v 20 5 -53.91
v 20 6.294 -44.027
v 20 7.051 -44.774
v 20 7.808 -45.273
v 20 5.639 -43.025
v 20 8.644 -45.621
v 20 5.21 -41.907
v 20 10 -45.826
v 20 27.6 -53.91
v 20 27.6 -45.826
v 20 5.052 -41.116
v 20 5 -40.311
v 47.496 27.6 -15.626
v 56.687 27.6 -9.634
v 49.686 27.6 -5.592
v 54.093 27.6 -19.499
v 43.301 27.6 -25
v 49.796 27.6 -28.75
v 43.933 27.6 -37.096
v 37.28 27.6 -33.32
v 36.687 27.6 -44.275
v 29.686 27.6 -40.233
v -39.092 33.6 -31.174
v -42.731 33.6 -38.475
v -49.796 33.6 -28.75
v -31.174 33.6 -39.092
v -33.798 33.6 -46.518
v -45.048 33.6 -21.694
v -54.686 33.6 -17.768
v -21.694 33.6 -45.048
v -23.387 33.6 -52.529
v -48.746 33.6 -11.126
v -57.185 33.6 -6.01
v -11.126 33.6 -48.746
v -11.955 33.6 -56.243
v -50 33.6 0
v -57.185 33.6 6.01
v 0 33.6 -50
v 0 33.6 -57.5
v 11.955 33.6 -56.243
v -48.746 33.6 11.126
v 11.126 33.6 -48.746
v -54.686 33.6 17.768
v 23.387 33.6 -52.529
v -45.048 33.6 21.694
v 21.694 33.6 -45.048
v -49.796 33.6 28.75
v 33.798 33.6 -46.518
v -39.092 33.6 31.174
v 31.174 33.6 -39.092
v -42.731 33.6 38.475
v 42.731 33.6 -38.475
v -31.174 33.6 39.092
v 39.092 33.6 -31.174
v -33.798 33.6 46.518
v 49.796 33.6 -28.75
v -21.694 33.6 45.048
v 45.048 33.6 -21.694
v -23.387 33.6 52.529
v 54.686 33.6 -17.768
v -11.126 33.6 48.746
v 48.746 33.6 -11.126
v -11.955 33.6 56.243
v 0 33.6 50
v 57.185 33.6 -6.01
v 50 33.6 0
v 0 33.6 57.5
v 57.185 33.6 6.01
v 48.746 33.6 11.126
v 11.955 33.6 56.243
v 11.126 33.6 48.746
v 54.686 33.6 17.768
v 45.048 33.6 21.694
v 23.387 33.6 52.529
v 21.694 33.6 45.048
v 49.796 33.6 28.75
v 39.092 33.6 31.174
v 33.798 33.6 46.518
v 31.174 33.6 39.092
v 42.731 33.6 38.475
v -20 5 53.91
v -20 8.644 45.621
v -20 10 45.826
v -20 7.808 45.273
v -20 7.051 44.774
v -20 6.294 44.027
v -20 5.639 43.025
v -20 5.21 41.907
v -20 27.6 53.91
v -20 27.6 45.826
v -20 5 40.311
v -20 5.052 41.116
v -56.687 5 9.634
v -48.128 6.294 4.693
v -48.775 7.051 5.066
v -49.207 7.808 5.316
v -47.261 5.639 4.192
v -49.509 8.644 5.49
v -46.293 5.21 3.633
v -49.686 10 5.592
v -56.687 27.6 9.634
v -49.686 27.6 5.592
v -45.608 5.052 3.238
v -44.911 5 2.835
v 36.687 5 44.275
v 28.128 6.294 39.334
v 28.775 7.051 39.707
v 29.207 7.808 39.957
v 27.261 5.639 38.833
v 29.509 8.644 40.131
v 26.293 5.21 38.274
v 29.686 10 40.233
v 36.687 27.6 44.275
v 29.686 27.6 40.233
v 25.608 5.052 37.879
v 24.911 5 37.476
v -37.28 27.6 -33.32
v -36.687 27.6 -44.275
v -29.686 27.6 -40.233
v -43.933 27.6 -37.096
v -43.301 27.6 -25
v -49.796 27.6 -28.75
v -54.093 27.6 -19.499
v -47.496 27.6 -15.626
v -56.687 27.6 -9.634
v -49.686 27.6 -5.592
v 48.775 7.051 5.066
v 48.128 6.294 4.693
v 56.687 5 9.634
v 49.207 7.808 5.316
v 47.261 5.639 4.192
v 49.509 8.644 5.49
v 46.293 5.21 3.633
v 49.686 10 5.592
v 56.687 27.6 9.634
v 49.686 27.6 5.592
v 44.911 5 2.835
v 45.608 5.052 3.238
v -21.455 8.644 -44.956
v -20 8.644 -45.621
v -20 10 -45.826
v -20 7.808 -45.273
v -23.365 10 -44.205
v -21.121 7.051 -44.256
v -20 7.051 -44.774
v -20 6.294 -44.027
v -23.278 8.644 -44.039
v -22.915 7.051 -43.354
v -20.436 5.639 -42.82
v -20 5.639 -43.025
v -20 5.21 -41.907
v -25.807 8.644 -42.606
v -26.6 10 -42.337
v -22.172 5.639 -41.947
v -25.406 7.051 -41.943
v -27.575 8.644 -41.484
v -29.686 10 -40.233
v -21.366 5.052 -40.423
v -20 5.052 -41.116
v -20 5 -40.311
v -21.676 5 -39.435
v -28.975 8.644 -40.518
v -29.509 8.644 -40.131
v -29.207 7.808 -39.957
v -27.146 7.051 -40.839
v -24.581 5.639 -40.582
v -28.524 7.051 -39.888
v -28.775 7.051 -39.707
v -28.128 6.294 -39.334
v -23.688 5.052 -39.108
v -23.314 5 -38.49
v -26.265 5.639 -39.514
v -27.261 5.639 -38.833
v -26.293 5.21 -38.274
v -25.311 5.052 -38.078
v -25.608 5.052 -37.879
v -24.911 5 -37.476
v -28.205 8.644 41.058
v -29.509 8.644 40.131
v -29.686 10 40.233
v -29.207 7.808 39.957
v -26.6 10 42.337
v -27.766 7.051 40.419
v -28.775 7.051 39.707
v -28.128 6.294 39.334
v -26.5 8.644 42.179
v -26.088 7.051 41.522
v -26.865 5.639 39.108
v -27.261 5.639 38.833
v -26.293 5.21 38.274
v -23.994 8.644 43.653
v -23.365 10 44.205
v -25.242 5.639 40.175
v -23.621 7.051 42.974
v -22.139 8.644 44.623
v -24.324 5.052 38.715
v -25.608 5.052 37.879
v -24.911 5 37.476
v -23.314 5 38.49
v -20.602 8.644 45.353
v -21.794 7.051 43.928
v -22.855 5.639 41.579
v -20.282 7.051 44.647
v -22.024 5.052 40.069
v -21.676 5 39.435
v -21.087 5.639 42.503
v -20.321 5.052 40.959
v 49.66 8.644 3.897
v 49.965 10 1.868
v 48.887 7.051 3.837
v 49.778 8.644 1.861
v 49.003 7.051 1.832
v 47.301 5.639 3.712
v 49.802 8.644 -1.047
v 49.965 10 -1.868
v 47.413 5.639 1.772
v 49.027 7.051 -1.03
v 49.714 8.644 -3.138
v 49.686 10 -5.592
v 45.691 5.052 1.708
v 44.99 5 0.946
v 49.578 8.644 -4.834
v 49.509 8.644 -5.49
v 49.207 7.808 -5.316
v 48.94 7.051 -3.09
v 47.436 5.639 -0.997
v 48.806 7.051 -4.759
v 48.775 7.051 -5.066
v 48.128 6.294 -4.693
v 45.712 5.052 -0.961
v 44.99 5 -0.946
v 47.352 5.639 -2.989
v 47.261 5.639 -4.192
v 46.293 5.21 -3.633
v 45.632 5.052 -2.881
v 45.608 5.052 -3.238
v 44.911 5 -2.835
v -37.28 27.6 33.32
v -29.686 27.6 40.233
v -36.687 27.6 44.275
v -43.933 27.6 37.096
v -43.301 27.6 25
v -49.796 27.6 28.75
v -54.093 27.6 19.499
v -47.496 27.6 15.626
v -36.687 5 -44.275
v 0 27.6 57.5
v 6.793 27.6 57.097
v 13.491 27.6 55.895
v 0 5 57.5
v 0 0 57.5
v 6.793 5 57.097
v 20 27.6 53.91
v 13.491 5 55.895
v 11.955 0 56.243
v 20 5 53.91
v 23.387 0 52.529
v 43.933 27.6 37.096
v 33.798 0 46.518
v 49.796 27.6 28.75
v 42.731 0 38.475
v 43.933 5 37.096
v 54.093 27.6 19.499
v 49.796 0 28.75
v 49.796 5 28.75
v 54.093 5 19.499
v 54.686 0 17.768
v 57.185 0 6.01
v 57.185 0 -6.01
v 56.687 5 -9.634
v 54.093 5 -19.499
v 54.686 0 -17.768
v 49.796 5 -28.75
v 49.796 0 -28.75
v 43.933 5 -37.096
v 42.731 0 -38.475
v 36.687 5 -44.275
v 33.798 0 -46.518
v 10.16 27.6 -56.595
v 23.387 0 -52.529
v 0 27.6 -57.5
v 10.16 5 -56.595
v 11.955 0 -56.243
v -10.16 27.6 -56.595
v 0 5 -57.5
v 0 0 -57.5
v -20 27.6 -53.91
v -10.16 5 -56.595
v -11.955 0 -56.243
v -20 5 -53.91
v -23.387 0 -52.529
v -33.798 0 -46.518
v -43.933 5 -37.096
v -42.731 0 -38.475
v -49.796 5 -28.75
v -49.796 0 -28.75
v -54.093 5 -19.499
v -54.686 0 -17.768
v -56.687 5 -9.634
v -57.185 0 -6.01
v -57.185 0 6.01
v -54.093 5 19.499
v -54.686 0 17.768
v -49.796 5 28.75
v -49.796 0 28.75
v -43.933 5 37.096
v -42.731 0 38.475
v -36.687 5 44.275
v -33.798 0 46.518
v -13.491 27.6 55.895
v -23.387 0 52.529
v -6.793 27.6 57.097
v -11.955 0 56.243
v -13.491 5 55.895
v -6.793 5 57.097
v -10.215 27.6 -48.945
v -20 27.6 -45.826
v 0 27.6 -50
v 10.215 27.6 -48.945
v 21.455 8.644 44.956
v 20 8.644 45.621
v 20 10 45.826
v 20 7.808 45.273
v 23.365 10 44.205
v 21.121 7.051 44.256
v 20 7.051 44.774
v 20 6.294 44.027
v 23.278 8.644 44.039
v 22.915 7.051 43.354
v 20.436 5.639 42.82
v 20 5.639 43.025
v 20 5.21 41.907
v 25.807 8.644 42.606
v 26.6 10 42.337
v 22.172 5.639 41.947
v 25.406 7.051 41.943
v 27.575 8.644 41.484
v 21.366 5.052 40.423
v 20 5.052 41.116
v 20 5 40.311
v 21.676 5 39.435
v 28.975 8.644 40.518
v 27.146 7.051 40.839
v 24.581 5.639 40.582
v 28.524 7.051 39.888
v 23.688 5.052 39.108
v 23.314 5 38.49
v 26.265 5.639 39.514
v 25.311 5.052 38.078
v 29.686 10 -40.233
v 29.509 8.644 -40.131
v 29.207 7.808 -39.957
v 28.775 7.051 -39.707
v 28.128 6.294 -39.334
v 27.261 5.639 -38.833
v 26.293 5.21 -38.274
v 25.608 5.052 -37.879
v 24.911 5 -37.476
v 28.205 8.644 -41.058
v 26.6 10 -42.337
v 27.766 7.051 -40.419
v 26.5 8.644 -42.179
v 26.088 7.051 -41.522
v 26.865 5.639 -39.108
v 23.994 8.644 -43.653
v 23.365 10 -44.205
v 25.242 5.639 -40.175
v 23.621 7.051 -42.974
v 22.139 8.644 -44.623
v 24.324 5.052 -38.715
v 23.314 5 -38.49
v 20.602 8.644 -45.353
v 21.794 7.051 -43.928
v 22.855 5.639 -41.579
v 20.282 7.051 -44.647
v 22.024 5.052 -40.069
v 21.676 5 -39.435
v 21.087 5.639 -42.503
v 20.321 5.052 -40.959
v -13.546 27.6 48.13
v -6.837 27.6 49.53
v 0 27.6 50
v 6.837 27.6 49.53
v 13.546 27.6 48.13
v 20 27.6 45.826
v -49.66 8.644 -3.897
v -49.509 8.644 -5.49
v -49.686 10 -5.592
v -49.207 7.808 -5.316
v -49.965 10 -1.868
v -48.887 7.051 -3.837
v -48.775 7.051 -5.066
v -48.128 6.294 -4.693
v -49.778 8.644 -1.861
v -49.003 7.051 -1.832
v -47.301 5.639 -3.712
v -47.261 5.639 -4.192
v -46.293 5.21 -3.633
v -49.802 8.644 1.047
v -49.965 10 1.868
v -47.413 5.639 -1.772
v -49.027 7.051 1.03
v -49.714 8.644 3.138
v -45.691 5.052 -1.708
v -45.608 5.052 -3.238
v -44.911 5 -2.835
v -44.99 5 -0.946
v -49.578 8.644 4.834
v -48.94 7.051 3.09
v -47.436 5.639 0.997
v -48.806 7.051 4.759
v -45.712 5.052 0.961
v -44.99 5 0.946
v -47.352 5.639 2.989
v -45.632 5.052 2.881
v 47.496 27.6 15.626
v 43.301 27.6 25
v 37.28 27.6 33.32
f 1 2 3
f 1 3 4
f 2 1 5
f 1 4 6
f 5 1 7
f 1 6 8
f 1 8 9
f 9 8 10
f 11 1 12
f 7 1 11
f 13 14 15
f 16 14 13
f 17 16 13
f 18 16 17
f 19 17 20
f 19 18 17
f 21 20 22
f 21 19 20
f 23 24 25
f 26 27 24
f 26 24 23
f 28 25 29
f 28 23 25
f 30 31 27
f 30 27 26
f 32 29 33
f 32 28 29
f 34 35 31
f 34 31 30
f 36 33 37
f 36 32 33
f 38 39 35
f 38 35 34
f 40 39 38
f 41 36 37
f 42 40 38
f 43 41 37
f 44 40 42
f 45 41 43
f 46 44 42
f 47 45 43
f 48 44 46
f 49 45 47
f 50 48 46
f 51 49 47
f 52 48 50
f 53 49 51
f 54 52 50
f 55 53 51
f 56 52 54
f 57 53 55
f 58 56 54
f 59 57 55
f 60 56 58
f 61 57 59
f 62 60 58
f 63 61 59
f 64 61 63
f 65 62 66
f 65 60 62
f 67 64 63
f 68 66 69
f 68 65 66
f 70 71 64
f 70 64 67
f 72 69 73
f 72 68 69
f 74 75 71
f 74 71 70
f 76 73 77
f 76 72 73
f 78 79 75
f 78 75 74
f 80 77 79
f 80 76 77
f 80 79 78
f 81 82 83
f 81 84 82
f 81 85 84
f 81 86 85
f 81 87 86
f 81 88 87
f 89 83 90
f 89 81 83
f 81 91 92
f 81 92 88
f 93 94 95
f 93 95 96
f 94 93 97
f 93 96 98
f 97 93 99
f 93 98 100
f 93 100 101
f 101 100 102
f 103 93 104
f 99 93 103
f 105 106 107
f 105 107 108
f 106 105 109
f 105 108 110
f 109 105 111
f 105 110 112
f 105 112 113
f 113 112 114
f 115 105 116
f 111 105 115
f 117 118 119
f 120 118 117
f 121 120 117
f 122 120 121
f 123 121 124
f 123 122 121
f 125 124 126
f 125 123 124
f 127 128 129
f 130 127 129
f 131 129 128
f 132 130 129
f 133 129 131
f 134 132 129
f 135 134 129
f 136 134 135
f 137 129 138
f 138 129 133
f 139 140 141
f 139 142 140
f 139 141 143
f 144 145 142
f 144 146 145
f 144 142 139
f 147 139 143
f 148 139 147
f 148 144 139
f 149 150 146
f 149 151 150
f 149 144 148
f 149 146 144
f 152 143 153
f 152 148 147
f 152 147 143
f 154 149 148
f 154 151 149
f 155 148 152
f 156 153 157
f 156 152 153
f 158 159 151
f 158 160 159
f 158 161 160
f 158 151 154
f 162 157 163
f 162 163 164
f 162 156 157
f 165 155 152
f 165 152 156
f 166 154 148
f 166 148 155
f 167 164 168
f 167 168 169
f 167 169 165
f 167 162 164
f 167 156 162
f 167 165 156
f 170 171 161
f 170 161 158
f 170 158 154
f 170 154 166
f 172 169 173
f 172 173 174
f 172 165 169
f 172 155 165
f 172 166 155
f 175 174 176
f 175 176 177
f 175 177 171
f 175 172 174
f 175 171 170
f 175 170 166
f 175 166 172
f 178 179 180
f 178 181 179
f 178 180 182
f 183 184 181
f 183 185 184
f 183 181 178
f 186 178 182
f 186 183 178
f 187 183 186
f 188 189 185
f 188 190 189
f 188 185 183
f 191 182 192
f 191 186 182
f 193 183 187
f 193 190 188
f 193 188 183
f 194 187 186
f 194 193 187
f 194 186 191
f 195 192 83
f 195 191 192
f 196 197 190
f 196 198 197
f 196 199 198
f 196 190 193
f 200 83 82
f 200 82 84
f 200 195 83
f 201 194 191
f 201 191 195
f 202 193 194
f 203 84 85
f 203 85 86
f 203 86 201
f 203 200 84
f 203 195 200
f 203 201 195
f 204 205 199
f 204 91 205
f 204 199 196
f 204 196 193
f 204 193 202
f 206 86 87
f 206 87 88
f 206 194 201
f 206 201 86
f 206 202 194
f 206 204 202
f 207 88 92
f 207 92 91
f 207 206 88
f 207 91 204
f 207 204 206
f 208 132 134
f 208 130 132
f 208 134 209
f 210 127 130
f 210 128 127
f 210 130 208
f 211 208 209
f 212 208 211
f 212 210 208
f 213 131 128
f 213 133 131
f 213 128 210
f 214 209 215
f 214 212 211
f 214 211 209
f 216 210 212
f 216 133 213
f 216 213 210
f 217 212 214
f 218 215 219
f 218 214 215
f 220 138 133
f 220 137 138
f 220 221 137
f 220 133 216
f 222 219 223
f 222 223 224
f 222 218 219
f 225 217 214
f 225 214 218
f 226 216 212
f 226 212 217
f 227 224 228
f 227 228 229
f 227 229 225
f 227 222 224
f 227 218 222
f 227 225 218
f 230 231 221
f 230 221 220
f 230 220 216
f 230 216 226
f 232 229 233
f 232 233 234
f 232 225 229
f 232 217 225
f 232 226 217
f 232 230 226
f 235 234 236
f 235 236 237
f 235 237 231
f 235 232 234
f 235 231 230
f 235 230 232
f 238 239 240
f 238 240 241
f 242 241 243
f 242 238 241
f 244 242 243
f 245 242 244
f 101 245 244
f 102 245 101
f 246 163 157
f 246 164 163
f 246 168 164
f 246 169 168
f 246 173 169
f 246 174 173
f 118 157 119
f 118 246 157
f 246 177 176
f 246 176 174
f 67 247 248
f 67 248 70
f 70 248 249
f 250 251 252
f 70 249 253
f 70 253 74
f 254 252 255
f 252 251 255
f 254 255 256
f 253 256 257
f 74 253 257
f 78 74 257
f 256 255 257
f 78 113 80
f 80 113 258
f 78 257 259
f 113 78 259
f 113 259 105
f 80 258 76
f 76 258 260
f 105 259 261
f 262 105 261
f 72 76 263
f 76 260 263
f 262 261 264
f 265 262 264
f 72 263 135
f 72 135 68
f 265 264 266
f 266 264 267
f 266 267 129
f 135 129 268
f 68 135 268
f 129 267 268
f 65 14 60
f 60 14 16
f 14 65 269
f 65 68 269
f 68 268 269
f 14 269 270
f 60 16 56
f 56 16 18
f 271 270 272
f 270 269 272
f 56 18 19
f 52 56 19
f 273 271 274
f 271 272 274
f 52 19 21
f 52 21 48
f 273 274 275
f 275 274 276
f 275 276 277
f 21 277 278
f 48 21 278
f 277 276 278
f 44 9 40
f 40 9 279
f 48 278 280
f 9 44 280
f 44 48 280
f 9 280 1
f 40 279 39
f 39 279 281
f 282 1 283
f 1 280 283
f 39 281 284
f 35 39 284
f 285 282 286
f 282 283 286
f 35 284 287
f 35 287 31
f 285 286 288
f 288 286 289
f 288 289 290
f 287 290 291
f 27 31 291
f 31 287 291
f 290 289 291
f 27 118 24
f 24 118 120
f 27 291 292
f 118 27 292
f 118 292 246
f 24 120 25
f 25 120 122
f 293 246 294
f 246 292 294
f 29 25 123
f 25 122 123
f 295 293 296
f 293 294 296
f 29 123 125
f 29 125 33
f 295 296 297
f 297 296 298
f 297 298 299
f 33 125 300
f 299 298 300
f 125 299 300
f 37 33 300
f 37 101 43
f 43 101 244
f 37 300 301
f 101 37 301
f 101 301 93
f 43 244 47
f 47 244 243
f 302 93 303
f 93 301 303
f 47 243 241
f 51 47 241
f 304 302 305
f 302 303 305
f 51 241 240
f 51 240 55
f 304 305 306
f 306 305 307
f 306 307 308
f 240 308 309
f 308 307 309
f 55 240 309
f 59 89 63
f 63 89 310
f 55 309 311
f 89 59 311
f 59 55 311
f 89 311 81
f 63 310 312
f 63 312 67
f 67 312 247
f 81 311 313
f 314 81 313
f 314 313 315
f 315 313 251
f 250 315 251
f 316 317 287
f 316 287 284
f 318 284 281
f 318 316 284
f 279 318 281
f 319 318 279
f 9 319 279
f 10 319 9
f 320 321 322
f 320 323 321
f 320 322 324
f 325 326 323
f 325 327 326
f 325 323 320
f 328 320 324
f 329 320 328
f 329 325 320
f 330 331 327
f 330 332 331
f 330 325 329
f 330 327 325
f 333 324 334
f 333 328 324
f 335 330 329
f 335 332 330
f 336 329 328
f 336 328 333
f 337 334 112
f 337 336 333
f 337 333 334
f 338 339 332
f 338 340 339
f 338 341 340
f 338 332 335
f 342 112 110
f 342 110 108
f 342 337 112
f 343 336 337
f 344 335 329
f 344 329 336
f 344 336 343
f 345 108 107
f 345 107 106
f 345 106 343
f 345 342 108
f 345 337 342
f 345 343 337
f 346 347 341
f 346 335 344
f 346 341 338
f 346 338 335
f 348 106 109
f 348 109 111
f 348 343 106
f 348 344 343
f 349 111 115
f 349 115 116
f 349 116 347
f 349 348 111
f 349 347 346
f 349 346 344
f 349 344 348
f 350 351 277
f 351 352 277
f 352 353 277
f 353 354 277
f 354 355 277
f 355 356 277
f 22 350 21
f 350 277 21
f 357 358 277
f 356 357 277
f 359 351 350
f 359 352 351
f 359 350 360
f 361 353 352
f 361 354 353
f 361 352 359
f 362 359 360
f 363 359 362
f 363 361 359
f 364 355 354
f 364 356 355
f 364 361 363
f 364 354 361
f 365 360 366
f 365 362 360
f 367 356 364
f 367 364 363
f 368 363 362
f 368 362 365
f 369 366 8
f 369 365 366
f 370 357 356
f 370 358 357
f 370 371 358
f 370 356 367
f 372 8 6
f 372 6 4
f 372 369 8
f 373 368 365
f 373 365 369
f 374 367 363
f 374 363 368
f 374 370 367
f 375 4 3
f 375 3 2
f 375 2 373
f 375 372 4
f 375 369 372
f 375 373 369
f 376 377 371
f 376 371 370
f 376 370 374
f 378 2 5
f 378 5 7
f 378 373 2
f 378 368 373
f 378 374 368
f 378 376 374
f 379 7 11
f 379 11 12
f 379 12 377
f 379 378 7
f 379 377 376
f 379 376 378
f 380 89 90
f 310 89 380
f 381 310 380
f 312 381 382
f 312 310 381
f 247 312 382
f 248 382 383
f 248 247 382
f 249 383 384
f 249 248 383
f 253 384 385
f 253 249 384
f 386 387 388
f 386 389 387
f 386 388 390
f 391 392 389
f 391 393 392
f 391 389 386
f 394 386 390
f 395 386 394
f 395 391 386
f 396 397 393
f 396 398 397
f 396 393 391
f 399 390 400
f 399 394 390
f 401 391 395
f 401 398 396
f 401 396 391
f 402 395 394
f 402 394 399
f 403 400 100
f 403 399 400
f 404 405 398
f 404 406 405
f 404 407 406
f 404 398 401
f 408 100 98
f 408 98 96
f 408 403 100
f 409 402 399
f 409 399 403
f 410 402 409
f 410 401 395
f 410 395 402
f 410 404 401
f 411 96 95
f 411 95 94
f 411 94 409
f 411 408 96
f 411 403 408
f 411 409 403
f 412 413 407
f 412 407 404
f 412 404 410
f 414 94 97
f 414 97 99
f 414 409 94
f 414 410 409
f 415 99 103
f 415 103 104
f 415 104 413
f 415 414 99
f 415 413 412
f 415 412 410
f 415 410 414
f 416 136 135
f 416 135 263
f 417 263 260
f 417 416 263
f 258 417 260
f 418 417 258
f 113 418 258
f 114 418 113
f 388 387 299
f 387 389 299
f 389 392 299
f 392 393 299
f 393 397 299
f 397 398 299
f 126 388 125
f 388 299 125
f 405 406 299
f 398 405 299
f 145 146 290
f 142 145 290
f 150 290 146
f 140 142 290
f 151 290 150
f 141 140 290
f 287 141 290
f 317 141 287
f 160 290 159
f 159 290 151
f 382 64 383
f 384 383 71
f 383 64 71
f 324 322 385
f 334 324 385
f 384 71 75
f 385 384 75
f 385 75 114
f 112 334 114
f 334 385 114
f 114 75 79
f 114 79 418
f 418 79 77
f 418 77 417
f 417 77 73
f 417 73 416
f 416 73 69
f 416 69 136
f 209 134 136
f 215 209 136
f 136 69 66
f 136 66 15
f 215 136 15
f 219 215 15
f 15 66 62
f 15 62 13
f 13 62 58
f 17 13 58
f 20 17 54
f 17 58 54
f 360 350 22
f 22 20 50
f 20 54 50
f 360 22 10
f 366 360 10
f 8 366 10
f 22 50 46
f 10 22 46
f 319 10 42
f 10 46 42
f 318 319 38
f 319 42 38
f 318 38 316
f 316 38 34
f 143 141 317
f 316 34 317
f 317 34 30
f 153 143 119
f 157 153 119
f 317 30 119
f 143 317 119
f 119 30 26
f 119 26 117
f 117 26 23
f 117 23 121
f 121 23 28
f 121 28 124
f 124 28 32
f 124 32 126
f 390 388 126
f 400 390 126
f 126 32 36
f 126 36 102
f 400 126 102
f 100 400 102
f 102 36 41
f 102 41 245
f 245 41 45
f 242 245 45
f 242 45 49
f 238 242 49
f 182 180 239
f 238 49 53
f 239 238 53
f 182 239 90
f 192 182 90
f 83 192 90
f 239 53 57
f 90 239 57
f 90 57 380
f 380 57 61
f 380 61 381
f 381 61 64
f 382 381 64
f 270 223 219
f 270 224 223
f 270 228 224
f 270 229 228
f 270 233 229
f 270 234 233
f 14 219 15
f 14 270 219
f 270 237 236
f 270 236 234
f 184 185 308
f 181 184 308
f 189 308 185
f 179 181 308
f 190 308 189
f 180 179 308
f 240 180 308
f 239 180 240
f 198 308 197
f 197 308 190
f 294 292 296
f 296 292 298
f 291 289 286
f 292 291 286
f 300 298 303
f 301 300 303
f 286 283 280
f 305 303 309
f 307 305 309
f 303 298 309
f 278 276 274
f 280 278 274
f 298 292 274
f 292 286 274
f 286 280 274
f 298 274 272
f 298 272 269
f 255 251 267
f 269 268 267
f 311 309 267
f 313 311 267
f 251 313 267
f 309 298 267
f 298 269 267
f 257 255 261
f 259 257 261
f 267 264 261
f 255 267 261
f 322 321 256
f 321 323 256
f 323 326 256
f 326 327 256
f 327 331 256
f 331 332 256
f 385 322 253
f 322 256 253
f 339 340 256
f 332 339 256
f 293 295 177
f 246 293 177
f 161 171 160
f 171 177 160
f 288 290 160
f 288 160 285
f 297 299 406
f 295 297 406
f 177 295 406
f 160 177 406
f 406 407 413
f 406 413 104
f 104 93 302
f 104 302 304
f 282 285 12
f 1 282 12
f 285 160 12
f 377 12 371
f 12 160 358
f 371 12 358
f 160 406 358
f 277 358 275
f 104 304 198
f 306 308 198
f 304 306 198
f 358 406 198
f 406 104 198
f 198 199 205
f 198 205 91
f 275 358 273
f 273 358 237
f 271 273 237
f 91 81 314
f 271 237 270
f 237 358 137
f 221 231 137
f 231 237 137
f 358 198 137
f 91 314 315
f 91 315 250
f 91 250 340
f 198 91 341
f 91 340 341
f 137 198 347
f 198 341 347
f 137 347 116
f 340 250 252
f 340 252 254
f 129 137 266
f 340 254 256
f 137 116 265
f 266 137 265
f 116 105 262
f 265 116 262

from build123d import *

# Parameters (mm, degrees)
SKETCH1_R           = 57.5
BOSS_EXTRUDE1_DEPTH = 33.6
SKETCH2_R           = 50
CUT_EXTRUDE1_DEPTH  = 28.6
FILLET1_R           = 5
SKETCH3_W           = 40
SKETCH3_H           = 22.6
CUT_EXTRUDE2_DEPTH  = 88.985566998
CIRPATTERN1_COUNT   = 3


with BuildPart() as part:
    # Sketch1 → Boss-Extrude1 (new body)
    with BuildSketch(Plane(origin=(0, 0, 0), x_dir=(1, 0, 0), z_dir=(0, 1, 0))):
        with Locations(Location((0, 0, 0), (0, 0, 270))):
            Circle(SKETCH1_R)
    extrude(amount=BOSS_EXTRUDE1_DEPTH)

    # Sketch2 → Cut-Extrude1 (cut)
    with BuildSketch(Plane(origin=(0, 33.6, 0), x_dir=(1, 0, 0), z_dir=(0, 1, 0))):
        with Locations(Location((0, 0, 0), (0, 0, 270))):
            Circle(SKETCH2_R)
    extrude(amount=-CUT_EXTRUDE1_DEPTH, mode=Mode.SUBTRACT)

    # Fillet1
    fillet1_edges = [part.edges().sort_by_distance(p)[0] for p in [
        (0, 5, -50),
    ]]
    fillet(fillet1_edges, radius=FILLET1_R)

    # Sketch3 → Cut-Extrude2 (cut, symmetric)
    with BuildSketch(Plane.XY):
        with Locations((0, 16.3)):
            Rectangle(SKETCH3_W, SKETCH3_H)
    cut_extrude2 = extrude(amount=CUT_EXTRUDE2_DEPTH, both=True, mode=Mode.SUBTRACT)

    # CirPattern1: Cut-Extrude2 ×3 about axis
    cirpattern1_axis = Axis((0, 0, 0), (0, 1, 0))
    for i in range(1, CIRPATTERN1_COUNT):
        add(cut_extrude2.rotate(cirpattern1_axis, i * 360 / CIRPATTERN1_COUNT), mode=Mode.SUBTRACT)


solid = part.part
